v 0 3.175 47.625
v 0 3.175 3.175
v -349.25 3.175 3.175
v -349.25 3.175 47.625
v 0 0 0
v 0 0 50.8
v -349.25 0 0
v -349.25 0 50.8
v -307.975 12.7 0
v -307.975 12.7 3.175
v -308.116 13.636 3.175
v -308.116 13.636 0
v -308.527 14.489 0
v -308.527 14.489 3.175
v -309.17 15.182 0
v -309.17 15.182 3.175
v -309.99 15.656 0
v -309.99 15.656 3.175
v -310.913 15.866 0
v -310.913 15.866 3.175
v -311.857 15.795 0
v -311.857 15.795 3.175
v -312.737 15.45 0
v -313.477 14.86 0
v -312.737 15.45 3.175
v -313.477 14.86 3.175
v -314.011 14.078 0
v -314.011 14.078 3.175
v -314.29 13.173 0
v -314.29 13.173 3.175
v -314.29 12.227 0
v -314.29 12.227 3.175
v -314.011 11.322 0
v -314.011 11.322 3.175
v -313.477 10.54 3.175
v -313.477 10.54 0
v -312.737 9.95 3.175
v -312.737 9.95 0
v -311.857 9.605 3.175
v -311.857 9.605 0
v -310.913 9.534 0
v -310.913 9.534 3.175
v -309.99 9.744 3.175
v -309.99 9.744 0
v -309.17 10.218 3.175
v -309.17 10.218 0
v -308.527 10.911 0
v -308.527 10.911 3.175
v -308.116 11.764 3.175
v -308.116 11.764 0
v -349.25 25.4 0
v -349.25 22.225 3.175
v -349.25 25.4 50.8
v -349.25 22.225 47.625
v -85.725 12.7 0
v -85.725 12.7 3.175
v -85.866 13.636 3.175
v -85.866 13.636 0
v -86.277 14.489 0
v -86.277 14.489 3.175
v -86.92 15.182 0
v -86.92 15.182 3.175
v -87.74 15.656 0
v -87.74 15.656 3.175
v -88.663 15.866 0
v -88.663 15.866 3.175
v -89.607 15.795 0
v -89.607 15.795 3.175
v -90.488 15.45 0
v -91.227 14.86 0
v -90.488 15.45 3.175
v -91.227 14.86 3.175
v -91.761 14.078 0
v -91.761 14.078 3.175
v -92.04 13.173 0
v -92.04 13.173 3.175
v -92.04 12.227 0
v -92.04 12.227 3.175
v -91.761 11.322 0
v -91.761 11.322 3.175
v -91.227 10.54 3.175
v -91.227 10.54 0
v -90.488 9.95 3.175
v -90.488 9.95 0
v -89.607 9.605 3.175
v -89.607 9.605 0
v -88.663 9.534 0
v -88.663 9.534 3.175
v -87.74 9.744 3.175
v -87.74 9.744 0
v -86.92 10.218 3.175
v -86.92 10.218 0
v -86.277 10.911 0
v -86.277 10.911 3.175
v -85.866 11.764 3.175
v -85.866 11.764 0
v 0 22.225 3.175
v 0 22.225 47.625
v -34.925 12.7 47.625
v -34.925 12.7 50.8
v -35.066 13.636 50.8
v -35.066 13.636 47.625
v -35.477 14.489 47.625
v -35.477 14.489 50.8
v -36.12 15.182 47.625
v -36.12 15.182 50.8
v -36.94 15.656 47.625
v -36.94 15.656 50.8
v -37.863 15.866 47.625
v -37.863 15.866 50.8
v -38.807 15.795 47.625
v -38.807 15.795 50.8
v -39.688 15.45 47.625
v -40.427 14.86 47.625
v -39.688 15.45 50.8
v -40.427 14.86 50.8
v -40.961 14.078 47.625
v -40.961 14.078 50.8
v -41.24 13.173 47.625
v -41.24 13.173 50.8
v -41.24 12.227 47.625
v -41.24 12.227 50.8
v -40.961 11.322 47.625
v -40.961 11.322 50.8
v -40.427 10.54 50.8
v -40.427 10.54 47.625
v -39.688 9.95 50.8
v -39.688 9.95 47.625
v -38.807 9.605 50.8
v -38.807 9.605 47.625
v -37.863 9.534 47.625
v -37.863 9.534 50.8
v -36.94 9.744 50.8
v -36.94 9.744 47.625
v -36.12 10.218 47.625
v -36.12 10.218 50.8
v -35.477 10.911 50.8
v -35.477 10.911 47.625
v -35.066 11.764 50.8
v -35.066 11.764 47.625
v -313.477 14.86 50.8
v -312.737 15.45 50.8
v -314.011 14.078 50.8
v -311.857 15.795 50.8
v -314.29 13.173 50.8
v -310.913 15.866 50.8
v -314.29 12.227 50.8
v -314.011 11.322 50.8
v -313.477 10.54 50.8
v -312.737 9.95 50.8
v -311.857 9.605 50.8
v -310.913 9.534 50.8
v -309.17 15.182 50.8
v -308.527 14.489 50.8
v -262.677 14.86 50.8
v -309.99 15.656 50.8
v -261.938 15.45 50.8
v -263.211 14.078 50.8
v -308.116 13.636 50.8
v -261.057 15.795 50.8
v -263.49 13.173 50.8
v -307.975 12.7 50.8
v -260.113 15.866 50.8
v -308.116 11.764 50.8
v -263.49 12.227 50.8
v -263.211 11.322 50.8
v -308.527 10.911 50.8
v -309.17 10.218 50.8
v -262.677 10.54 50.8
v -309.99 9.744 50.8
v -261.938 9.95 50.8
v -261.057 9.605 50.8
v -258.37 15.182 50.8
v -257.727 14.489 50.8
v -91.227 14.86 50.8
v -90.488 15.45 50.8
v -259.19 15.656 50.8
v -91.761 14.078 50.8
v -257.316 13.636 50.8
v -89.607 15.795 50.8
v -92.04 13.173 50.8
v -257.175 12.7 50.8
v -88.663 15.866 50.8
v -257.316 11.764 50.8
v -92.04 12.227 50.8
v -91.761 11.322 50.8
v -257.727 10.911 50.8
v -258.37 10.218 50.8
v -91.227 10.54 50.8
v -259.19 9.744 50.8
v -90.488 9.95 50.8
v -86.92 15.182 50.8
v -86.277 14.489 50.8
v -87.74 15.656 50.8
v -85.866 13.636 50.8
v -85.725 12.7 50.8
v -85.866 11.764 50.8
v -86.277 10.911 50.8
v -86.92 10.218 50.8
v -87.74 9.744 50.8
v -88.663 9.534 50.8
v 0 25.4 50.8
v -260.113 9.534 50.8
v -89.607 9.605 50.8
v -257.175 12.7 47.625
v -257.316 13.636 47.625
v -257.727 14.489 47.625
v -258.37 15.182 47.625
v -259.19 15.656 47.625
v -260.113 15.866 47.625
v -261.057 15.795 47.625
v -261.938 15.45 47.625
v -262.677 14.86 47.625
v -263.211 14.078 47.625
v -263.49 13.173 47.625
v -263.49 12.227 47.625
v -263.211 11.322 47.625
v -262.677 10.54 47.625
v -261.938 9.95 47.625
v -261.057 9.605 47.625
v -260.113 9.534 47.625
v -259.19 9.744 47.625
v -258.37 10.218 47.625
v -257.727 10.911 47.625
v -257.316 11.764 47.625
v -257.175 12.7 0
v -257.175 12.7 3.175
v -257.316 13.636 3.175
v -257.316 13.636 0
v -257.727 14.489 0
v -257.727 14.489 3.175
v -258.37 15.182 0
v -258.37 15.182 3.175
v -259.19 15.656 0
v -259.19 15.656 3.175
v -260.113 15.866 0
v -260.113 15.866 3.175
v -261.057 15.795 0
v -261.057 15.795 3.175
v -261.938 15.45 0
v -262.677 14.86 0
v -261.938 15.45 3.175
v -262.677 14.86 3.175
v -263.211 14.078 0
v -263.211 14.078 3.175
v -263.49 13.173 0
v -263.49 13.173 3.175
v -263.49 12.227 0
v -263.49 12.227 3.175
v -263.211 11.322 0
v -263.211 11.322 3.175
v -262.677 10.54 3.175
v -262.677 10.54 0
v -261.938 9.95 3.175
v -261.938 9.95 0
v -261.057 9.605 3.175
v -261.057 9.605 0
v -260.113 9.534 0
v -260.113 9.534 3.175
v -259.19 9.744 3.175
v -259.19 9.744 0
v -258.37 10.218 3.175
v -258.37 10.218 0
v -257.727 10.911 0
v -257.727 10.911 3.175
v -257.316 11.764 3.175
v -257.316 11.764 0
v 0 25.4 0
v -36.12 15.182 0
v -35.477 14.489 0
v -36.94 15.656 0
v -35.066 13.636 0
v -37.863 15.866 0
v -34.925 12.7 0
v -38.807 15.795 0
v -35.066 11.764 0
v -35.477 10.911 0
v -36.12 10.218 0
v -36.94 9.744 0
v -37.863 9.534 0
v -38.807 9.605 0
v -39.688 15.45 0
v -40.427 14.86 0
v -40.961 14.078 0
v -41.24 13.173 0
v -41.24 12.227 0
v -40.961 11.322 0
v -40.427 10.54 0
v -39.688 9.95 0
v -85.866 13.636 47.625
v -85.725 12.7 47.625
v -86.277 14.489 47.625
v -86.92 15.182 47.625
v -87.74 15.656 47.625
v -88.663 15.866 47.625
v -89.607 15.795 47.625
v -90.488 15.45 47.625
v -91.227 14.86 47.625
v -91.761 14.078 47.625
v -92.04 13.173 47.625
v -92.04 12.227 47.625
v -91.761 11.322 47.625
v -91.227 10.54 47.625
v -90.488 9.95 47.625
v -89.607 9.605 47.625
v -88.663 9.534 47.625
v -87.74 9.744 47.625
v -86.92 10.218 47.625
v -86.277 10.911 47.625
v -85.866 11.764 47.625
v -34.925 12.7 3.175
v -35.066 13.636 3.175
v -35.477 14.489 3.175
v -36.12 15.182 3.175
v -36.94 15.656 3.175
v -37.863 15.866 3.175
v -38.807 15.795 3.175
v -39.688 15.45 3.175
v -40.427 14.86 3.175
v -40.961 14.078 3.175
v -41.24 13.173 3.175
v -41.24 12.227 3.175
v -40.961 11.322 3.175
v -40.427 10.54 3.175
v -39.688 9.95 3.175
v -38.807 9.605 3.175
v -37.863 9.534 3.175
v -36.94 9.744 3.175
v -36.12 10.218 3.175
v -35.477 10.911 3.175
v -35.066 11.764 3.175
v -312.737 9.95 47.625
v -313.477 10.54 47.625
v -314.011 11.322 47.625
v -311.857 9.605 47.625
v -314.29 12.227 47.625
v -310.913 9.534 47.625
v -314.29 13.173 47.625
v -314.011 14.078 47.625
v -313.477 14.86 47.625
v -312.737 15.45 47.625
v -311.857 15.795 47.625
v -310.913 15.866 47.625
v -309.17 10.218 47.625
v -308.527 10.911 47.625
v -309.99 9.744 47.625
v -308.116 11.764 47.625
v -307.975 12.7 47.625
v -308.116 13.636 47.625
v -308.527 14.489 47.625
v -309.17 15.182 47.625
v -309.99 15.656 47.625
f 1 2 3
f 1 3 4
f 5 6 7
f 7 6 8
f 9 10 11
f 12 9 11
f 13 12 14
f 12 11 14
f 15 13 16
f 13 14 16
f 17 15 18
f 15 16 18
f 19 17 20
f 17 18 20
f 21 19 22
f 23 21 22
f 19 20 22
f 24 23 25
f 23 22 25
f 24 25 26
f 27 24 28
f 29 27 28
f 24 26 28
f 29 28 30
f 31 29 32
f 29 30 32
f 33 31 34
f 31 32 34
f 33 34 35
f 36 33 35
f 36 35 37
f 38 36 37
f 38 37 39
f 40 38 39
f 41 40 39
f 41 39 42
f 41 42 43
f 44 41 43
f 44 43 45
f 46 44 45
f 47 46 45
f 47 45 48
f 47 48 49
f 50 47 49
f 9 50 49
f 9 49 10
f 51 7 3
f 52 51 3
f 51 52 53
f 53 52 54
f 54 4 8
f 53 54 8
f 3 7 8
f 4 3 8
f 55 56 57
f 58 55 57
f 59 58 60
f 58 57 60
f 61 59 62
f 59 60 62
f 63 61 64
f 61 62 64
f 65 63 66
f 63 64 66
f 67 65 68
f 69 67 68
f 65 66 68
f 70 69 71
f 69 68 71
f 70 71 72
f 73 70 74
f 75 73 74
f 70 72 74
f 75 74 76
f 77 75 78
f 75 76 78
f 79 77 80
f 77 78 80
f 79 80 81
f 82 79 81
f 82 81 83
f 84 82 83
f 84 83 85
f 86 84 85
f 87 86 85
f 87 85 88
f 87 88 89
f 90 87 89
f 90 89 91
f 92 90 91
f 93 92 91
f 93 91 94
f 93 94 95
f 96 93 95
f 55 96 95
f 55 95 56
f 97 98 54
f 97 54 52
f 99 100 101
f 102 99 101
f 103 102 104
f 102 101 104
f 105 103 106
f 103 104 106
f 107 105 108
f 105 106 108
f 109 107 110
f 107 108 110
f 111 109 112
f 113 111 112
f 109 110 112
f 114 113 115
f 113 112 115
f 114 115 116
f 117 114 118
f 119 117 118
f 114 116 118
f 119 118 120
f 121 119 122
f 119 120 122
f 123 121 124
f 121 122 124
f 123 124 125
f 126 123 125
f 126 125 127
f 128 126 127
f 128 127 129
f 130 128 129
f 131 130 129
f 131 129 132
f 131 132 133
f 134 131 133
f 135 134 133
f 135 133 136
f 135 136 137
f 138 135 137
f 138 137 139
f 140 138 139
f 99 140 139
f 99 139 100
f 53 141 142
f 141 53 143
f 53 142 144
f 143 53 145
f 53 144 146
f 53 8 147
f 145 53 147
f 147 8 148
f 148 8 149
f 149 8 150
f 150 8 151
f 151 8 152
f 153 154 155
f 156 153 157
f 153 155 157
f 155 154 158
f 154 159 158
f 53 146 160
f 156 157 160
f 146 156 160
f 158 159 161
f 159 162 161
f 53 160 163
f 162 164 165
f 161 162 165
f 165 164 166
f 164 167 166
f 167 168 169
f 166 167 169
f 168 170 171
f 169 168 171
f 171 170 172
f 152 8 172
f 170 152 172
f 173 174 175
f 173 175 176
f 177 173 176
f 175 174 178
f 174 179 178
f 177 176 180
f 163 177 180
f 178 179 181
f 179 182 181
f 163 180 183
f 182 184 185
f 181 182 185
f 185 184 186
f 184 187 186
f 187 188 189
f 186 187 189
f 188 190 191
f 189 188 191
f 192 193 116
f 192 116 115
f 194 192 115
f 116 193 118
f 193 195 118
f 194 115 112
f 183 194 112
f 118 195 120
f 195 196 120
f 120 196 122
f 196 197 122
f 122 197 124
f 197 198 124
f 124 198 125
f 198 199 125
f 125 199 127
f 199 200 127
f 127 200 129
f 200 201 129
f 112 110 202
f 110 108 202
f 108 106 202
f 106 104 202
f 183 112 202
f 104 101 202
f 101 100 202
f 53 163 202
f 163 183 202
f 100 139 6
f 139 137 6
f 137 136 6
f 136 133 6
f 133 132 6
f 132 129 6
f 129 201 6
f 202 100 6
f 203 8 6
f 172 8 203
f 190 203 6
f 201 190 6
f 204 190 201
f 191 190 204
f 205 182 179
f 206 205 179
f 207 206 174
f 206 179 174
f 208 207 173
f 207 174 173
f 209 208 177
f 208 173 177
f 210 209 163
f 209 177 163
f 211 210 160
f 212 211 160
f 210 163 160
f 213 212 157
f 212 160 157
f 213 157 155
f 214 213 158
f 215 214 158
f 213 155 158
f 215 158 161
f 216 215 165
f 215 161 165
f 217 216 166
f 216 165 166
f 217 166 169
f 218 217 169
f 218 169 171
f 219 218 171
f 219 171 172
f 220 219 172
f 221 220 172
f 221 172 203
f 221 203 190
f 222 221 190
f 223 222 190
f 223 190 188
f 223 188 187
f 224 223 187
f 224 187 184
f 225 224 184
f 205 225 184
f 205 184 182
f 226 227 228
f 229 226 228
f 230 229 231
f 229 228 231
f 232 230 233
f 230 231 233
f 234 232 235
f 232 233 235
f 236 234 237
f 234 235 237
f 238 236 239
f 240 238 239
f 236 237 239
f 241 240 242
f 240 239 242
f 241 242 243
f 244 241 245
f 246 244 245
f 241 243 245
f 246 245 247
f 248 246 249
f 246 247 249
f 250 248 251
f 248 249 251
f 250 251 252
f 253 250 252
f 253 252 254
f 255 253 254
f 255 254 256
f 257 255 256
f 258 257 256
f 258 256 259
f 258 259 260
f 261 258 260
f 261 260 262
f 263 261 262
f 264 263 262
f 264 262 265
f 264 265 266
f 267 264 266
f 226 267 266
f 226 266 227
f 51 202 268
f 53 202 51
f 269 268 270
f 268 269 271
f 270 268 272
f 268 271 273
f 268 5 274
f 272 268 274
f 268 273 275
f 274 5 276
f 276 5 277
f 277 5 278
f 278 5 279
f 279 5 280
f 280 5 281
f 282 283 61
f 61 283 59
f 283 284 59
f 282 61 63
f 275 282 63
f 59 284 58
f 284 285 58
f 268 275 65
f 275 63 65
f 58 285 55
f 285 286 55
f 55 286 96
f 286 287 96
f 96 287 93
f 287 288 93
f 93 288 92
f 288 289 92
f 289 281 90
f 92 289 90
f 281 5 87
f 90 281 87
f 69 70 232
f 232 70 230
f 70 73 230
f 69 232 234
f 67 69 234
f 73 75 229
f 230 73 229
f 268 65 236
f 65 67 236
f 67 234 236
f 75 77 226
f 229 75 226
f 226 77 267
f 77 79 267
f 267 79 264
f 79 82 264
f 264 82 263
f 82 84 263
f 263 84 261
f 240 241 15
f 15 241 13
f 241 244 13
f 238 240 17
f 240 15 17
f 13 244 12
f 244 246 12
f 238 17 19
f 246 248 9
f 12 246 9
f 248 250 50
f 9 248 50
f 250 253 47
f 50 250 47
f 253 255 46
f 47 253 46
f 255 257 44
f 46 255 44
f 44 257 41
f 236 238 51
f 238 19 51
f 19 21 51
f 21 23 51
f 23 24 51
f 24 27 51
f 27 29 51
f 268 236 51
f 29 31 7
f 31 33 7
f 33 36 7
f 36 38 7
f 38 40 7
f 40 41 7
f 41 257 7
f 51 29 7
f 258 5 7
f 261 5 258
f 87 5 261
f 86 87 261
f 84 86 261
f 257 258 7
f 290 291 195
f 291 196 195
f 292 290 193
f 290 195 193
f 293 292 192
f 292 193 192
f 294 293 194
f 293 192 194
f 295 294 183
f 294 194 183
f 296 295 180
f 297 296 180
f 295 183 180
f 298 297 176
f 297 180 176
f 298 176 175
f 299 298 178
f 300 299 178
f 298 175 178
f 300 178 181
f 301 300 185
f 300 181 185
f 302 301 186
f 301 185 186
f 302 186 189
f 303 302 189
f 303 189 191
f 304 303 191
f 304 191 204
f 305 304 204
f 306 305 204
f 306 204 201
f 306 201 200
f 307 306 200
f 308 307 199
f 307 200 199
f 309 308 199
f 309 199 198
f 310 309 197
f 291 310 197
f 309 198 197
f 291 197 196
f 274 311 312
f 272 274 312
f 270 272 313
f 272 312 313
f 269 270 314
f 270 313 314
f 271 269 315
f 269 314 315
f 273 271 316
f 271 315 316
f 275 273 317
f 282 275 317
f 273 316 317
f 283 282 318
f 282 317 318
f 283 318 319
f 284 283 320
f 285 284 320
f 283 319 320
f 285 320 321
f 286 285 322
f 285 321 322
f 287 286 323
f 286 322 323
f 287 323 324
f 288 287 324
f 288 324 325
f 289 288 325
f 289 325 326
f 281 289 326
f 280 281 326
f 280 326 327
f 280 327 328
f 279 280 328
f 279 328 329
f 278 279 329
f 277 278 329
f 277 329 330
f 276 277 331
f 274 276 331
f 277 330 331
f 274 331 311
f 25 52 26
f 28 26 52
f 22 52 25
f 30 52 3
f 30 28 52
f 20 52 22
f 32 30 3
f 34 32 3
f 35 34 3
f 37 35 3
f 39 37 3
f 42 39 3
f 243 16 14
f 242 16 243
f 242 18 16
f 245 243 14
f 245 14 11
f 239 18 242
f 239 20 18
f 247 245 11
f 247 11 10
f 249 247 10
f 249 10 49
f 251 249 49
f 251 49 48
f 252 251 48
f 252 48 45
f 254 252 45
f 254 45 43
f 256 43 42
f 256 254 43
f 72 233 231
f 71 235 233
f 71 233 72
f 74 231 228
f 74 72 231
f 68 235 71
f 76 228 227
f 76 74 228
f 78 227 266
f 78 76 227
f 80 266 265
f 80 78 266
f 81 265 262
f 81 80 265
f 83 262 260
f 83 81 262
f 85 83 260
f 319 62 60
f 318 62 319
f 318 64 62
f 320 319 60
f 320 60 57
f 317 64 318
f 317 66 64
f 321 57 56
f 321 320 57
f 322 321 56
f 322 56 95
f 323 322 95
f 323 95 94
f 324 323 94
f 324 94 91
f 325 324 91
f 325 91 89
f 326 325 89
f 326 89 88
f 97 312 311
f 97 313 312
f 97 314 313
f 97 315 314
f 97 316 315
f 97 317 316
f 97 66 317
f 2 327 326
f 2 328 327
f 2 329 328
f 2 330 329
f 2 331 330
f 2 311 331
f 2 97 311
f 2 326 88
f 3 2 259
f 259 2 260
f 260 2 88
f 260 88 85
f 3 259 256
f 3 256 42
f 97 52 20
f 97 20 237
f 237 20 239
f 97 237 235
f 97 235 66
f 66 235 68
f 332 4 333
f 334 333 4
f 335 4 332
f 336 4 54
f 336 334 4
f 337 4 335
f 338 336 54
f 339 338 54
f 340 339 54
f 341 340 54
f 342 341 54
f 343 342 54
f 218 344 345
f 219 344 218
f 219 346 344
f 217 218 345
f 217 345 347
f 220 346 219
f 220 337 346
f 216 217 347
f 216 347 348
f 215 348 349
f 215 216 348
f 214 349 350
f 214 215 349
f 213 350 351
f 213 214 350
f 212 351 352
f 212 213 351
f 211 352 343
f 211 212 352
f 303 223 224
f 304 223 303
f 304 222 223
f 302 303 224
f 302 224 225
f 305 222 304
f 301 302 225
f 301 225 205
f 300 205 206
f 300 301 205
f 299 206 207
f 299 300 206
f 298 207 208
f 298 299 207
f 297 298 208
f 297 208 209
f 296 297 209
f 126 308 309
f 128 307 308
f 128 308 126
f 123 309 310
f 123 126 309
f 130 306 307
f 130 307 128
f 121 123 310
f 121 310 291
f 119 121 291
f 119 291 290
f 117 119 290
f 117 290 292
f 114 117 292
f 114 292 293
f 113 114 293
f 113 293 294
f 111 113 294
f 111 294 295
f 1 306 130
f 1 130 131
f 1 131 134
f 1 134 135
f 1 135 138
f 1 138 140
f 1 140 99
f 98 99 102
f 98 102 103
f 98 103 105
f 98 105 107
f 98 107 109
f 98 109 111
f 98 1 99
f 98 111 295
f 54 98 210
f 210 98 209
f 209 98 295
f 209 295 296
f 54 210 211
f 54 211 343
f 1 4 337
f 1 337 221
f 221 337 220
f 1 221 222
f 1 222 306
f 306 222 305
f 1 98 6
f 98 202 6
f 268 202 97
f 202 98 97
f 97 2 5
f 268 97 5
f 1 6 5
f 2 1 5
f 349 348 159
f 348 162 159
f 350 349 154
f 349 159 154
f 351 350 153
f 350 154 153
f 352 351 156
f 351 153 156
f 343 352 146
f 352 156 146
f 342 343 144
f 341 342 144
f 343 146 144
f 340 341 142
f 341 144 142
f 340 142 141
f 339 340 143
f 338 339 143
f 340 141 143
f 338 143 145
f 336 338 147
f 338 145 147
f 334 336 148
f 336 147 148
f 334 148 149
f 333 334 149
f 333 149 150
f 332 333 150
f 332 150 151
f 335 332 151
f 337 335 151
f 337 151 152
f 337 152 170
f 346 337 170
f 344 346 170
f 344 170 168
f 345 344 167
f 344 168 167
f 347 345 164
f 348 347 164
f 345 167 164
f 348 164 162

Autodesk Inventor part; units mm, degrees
ref_plane "YZ Plane" through (0, 0, 0) normal (1, 0, 0) x (0, 1, 0)
ref_plane "XZ Plane" through (0, 0, 0) normal (0, 1, 0) x (-1, 0, 0)
ref_plane "XY Plane" through (0, 0, 0) normal (0, 0, 1) x (1, 0, 0)
sketch "Sketch1" plane through (0, 0, 0) normal (0, 1, 0) x (-1, 0, 0)
  line L0 (0, 0) -> (349.25, 0)
  line L1 (349.25, 0) -> (349.25, 50.8)
  line L2 (349.25, 50.8) -> (0, 50.8)
  line L3 (0, 50.8) -> (0, 0)
  dimension "d0" = 349.25
  dimension "d1" = 50.8
extrude "Extrusion1" add sketch "Sketch1" along normal blind 25.4
sketch "Sketch2" plane through (0, 0, 50.8) normal (1, 0, 0) x (0, 0, -1)
  line L0 (0, 25.4) -> (3.175, 25.4)
  line L1 (3.175, 25.4) -> (3.175, 22.225)
  line L2 (3.175, 22.225) -> (0, 22.225)
  line L3 (0, 22.225) -> (0, 25.4)
  line L4 (3.175, 22.225) -> (47.625, 22.225)
  line L5 (47.625, 22.225) -> (47.625, 3.175)
  line L6 (47.625, 3.175) -> (3.175, 3.175)
  line L7 (3.175, 3.175) -> (3.175, 22.225)
  dimension "d4" = 3.175
  dimension "d5" = 3.175
  dimension "d6" = 44.45
  dimension "d7" = 19.05
extrude "Extrusion2" cut sketch "Sketch2" against normal blind 508 contours L4 L5 L6 L7
sketch "Sketch3" plane through (-349.25, 0, 50.8) normal (0, 0, 1) x (1, 0, 0)
  line L0 (349.25, 0) -> (349.25, 25.4) projected
  line L1 (0, 0) -> (0, 25.4) projected
  line L2 (0, 12.7) -> (38.1, 12.7)
  line L3 (0, 12.7) -> (38.1, 12.7) construction
  line L4 (38.1, 12.7) -> (88.9, 12.7)
  circle A0 centre (88.9, 12.7) radius 3.175
  circle A1 centre (38.1, 12.7) radius 3.175
  line L5 (349.25, 12.7) -> (311.15, 12.7)
  line L6 (349.25, 12.7) -> (387.35, 12.7) construction
  line L7 (311.15, 12.7) -> (260.35, 12.7)
  line L8 (311.15, 12.7) -> (361.95, 12.7) construction
  circle A2 centre (260.35, 12.7) radius 3.175
  circle A3 centre (311.15, 12.7) radius 3.175
  dimension "d10" = 38.1
  dimension "d11" = 0
  dimension "d12" = 50.8
  dimension "d13" = 180
  dimension "d14" = 6.35
  dimension "d15" = 6.35
  dimension "d16" = 38.1
  dimension "d17" = 180
  dimension "d18" = 50.8
  dimension "d19" = 180
  dimension "d20" = 6.35
  dimension "d21" = 6.35
extrude "Extrusion3" cut sketch "Sketch3" against normal blind 50.8
properties part number "CatapultMotorSupport"
